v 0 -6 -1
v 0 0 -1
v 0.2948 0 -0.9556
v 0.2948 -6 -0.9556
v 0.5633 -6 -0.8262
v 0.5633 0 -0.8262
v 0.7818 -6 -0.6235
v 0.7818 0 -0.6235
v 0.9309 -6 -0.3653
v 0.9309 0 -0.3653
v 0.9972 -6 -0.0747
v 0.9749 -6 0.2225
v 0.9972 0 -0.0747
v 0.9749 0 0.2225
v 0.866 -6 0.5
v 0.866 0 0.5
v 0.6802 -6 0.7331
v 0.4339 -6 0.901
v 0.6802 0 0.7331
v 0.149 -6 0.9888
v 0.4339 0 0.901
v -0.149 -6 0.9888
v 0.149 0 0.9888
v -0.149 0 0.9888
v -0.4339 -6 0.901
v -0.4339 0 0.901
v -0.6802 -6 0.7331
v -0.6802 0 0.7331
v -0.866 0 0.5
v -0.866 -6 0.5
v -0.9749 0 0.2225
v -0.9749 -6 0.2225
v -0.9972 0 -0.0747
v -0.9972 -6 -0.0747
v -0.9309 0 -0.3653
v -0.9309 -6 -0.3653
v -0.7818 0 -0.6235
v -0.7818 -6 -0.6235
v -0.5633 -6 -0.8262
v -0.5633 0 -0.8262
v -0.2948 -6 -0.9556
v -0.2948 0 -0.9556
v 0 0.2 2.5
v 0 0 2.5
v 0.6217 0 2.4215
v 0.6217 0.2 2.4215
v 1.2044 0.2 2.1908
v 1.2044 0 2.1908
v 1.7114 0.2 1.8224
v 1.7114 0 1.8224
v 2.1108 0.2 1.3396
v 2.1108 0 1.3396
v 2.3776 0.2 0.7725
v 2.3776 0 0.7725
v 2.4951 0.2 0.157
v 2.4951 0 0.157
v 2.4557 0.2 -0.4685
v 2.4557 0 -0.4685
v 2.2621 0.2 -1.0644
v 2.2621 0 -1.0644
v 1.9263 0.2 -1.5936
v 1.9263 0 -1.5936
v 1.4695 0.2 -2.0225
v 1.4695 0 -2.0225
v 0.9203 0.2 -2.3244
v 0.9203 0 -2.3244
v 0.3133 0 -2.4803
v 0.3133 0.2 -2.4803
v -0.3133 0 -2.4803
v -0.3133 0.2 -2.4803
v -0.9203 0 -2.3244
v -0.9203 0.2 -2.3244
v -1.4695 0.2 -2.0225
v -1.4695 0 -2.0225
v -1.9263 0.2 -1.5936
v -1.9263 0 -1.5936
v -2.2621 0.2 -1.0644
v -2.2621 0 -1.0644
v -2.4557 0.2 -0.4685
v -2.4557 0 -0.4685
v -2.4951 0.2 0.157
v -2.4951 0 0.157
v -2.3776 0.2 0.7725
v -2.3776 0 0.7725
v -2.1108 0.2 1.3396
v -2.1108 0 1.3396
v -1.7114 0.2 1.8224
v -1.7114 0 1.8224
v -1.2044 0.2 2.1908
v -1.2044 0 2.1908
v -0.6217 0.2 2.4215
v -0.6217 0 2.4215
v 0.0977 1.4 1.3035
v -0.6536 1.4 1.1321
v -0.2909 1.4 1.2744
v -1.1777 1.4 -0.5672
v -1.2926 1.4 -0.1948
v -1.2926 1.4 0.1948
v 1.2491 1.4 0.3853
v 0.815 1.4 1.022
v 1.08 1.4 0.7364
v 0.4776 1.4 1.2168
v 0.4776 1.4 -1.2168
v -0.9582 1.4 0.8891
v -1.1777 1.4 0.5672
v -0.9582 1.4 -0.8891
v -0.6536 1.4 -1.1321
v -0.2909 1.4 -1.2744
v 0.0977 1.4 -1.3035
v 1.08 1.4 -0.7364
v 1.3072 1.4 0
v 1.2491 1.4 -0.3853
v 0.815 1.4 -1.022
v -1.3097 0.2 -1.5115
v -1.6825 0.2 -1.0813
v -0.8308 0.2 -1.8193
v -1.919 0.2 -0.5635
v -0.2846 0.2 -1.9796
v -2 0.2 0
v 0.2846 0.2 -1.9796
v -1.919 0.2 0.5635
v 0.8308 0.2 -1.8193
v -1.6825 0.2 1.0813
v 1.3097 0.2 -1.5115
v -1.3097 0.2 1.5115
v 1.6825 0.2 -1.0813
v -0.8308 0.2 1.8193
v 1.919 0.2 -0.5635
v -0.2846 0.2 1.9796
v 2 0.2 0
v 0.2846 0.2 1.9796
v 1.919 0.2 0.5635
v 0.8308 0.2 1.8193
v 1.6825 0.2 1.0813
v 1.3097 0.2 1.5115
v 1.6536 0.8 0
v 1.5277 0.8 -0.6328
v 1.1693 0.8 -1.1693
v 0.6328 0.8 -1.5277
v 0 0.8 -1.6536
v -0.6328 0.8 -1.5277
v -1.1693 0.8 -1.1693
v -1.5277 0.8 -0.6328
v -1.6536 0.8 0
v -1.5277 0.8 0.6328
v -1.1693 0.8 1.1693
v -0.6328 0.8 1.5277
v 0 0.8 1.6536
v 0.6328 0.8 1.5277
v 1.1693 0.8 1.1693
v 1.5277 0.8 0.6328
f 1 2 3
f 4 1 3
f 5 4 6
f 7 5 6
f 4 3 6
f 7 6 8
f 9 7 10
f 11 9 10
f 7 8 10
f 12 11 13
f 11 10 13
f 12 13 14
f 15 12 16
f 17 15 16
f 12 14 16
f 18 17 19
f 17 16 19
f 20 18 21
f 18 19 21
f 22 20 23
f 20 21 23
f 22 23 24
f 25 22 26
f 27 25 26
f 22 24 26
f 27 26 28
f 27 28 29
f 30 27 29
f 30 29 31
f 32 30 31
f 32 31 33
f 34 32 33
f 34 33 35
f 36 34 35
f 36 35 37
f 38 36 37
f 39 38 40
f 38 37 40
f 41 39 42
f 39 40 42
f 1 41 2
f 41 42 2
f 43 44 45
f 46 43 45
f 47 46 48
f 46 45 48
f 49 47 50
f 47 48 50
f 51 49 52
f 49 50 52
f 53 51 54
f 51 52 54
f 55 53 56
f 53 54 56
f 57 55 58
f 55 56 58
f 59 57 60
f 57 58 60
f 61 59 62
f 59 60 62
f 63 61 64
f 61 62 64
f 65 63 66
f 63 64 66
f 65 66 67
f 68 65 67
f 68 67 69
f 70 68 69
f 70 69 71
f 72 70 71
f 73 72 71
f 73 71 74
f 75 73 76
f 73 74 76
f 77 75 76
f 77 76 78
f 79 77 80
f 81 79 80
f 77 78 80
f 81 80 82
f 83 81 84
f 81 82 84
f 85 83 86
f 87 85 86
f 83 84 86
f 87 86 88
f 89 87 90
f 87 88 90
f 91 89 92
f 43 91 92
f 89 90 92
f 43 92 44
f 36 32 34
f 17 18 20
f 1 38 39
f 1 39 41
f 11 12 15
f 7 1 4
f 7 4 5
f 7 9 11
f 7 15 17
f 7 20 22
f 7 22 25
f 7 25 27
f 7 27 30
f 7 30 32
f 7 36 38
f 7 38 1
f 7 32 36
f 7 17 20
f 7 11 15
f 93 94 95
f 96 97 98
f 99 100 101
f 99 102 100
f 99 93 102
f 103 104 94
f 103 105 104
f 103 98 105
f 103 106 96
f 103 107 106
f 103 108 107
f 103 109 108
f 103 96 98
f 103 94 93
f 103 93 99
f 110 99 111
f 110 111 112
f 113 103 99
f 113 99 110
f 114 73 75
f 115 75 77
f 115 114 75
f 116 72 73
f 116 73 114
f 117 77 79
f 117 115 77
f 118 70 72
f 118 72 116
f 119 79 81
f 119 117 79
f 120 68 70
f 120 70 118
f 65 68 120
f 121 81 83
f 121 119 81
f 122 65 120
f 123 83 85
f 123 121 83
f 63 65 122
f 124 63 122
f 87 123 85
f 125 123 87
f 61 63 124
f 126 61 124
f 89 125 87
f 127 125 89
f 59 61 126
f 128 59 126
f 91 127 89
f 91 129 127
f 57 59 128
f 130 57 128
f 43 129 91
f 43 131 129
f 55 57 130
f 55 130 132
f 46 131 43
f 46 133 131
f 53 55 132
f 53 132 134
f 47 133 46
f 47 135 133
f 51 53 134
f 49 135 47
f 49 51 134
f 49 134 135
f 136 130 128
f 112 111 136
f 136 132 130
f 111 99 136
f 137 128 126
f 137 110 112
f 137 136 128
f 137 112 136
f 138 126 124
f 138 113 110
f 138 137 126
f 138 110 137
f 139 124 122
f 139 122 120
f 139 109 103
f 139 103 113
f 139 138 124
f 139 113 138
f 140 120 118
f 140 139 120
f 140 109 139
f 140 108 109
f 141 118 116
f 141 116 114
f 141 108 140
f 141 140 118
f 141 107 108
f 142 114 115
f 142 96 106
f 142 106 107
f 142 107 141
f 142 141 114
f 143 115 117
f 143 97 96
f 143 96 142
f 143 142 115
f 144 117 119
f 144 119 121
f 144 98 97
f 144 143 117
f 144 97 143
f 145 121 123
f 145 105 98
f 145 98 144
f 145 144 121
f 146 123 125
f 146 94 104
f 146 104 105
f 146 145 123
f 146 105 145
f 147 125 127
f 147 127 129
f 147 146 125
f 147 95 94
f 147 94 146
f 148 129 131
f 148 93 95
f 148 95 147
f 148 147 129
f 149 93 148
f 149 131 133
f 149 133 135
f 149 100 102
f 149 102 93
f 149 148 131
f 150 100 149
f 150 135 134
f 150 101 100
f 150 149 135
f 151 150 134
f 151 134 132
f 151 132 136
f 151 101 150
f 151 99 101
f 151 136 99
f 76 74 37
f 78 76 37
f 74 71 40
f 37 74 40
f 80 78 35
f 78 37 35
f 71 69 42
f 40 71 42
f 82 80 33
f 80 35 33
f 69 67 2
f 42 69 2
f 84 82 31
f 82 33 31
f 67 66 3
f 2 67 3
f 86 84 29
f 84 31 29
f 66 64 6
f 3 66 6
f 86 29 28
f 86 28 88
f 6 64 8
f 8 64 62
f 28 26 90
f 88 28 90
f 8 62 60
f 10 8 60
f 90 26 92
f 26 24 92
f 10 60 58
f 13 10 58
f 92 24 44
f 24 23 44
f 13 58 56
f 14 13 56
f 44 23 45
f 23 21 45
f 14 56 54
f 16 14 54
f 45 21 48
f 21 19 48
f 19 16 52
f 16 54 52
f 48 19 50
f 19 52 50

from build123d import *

# Parameters (mm, degrees)
SKETCH_1_R      = 2.5
EXTRUDE_1_DEPTH = 0.2
SKETCH_2_R      = 1
EXTRUDE_2_DEPTH = 6
SKETCH_3_R      = 2
EXTRUDE_3_DEPTH = 1.2
EXTRUDE_3_TAPER = 30


with BuildPart() as part:
    # 스케치1 → 보스-돌출1 (new body)
    with BuildSketch(Plane(origin=(0, 0, 0), x_dir=(1, 0, 0), z_dir=(0, 1, 0))):
        with Locations(Location((0, 0, 0), (0, 0, 270))):
            Circle(SKETCH_1_R)
    extrude(amount=EXTRUDE_1_DEPTH)

    # 스케치2 → 보스-돌출2 (add)
    with BuildSketch(Plane.XZ):
        with Locations(Location((0, 0, 0), (0, 0, 270))):
            Circle(SKETCH_2_R)
    extrude(amount=EXTRUDE_2_DEPTH)

    # 스케치3 → 보스-돌출3 (add)
    with BuildSketch(Plane(origin=(0, 0.2, 0), x_dir=(1, 0, 0), z_dir=(0, 1, 0))):
        Circle(SKETCH_3_R)
    extrude(amount=EXTRUDE_3_DEPTH, taper=EXTRUDE_3_TAPER)


solid = part.part
